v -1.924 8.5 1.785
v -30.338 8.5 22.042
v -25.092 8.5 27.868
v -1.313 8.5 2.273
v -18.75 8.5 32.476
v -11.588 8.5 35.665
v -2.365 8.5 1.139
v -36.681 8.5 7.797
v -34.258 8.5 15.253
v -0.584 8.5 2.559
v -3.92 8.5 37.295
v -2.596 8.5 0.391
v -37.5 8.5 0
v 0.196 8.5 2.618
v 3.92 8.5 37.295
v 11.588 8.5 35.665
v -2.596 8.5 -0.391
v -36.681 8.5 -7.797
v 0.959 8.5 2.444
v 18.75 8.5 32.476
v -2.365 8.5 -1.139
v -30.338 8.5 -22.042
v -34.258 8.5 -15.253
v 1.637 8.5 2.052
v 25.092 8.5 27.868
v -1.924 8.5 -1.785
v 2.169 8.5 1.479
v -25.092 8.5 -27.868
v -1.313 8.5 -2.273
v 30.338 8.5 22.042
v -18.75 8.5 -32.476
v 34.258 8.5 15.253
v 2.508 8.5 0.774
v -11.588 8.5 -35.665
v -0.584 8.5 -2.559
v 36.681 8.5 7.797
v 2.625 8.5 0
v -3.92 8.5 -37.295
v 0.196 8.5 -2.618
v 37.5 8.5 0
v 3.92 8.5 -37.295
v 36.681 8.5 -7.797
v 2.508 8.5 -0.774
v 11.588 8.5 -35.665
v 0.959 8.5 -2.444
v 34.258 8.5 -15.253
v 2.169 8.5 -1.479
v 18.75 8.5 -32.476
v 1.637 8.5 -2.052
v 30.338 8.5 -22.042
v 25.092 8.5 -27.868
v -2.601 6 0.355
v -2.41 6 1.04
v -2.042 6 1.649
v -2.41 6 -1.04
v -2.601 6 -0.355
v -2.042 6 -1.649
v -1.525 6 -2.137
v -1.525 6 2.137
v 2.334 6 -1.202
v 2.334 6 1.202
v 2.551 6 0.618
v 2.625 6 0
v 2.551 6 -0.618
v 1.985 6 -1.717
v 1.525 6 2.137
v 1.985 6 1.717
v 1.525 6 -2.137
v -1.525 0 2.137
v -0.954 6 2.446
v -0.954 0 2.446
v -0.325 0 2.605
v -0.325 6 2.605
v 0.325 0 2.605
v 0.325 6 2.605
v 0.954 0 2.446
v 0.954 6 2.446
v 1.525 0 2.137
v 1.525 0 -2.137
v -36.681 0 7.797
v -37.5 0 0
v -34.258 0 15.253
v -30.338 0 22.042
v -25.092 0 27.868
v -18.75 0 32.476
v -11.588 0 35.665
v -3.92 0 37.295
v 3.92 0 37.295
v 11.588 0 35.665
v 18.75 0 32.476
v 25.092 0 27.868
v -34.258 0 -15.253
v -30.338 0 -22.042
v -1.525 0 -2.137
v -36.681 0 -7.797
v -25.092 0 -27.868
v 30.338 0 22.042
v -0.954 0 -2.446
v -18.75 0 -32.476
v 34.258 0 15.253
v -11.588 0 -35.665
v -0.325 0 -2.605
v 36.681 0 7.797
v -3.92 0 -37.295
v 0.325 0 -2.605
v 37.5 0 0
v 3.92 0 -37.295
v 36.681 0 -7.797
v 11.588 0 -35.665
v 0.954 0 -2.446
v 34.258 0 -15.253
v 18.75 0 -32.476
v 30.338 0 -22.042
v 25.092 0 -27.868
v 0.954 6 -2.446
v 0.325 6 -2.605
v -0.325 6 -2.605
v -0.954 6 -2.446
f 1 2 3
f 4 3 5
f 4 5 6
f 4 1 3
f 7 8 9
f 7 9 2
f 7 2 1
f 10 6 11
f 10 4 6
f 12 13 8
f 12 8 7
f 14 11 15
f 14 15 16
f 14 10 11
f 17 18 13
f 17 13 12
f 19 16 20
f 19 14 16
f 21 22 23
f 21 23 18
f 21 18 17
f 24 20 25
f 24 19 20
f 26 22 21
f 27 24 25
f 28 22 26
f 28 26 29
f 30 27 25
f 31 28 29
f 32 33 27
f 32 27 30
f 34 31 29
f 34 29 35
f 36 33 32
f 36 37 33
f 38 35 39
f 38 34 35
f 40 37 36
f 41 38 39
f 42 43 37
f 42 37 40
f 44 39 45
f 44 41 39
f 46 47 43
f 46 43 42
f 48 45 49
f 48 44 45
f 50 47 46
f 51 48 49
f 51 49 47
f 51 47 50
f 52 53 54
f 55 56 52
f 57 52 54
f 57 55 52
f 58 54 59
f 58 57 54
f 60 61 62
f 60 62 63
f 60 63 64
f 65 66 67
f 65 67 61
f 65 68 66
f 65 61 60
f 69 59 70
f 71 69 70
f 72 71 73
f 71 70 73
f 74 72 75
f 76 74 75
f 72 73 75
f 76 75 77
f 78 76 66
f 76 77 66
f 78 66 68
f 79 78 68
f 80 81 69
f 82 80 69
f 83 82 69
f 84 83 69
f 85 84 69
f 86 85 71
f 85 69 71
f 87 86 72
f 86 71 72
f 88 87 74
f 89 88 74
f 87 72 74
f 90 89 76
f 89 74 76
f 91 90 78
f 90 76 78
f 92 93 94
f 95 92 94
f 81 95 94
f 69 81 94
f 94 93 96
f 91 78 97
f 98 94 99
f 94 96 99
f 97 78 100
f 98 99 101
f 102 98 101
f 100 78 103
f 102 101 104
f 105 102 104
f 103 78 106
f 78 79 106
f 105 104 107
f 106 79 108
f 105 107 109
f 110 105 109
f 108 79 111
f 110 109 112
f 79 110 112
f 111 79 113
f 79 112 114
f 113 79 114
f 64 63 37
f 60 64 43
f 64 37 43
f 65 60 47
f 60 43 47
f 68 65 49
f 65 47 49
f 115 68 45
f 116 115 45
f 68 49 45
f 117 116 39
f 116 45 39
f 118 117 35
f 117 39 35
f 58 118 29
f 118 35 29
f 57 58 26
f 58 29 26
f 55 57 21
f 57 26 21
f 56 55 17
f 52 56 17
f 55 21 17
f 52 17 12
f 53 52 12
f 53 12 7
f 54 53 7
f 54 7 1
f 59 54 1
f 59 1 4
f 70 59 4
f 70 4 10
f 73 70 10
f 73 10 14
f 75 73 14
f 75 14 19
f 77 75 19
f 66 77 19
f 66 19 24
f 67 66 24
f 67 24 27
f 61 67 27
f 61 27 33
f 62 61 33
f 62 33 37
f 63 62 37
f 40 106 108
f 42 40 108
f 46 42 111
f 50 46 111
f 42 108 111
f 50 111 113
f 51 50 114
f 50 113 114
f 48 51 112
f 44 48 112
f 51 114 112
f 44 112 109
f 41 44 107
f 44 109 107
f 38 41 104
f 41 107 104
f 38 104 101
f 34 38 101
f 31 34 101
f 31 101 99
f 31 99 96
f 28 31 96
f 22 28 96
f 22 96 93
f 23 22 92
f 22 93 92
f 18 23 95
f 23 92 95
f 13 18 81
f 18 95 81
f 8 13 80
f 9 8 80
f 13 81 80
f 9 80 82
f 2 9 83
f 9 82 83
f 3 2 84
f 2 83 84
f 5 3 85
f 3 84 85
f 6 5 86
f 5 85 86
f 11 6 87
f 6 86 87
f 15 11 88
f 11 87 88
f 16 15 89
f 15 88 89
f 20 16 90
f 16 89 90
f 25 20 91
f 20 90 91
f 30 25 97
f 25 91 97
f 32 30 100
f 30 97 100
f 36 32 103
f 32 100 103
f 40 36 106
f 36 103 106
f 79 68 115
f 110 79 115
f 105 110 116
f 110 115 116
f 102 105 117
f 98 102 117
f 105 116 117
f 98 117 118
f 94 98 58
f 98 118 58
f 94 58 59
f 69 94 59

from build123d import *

# Parameters (mm, degrees)
SKETCH1_R           = 37.5
BOSS_EXTRUDE1_DEPTH = 8.5
SKETCH2_R           = 2.625
CUT_EXTRUDE1_DEPTH  = 2.5
CUT_EXTRUDE2_DEPTH  = 6


with BuildPart() as part:
    # Sketch1 → Boss-Extrude1 (new body)
    with BuildSketch(Plane(origin=(0, 0, 0), x_dir=(1, 0, 0), z_dir=(0, 1, 0))):
        Circle(SKETCH1_R)
    extrude(amount=BOSS_EXTRUDE1_DEPTH)

    # Sketch2 → Cut-Extrude1 (cut)
    with BuildSketch(Plane(origin=(0, 8.5, 0), x_dir=(1, 0, 0), z_dir=(0, 1, 0))):
        Circle(SKETCH2_R)
    extrude(amount=-CUT_EXTRUDE1_DEPTH, mode=Mode.SUBTRACT)

    # Sketch3 → Cut-Extrude2 (cut)
    with BuildSketch(Plane(origin=(0, 6, 0), x_dir=(1, 0, 0), z_dir=(0, 1, 0))):
        with BuildLine():
            Line((-1.525, 2.136586062), (-1.525, -2.136586062))
            ThreePointArc((-1.525, -2.136586062), (0, -2.625), (1.525, -2.136586062))
            Line((1.525, -2.136586062), (1.525, 2.136586062))
            ThreePointArc((1.525, 2.136586062), (0, 2.625), (-1.525, 2.136586062))
        make_face()
    extrude(amount=-CUT_EXTRUDE2_DEPTH, mode=Mode.SUBTRACT)


solid = part.part
